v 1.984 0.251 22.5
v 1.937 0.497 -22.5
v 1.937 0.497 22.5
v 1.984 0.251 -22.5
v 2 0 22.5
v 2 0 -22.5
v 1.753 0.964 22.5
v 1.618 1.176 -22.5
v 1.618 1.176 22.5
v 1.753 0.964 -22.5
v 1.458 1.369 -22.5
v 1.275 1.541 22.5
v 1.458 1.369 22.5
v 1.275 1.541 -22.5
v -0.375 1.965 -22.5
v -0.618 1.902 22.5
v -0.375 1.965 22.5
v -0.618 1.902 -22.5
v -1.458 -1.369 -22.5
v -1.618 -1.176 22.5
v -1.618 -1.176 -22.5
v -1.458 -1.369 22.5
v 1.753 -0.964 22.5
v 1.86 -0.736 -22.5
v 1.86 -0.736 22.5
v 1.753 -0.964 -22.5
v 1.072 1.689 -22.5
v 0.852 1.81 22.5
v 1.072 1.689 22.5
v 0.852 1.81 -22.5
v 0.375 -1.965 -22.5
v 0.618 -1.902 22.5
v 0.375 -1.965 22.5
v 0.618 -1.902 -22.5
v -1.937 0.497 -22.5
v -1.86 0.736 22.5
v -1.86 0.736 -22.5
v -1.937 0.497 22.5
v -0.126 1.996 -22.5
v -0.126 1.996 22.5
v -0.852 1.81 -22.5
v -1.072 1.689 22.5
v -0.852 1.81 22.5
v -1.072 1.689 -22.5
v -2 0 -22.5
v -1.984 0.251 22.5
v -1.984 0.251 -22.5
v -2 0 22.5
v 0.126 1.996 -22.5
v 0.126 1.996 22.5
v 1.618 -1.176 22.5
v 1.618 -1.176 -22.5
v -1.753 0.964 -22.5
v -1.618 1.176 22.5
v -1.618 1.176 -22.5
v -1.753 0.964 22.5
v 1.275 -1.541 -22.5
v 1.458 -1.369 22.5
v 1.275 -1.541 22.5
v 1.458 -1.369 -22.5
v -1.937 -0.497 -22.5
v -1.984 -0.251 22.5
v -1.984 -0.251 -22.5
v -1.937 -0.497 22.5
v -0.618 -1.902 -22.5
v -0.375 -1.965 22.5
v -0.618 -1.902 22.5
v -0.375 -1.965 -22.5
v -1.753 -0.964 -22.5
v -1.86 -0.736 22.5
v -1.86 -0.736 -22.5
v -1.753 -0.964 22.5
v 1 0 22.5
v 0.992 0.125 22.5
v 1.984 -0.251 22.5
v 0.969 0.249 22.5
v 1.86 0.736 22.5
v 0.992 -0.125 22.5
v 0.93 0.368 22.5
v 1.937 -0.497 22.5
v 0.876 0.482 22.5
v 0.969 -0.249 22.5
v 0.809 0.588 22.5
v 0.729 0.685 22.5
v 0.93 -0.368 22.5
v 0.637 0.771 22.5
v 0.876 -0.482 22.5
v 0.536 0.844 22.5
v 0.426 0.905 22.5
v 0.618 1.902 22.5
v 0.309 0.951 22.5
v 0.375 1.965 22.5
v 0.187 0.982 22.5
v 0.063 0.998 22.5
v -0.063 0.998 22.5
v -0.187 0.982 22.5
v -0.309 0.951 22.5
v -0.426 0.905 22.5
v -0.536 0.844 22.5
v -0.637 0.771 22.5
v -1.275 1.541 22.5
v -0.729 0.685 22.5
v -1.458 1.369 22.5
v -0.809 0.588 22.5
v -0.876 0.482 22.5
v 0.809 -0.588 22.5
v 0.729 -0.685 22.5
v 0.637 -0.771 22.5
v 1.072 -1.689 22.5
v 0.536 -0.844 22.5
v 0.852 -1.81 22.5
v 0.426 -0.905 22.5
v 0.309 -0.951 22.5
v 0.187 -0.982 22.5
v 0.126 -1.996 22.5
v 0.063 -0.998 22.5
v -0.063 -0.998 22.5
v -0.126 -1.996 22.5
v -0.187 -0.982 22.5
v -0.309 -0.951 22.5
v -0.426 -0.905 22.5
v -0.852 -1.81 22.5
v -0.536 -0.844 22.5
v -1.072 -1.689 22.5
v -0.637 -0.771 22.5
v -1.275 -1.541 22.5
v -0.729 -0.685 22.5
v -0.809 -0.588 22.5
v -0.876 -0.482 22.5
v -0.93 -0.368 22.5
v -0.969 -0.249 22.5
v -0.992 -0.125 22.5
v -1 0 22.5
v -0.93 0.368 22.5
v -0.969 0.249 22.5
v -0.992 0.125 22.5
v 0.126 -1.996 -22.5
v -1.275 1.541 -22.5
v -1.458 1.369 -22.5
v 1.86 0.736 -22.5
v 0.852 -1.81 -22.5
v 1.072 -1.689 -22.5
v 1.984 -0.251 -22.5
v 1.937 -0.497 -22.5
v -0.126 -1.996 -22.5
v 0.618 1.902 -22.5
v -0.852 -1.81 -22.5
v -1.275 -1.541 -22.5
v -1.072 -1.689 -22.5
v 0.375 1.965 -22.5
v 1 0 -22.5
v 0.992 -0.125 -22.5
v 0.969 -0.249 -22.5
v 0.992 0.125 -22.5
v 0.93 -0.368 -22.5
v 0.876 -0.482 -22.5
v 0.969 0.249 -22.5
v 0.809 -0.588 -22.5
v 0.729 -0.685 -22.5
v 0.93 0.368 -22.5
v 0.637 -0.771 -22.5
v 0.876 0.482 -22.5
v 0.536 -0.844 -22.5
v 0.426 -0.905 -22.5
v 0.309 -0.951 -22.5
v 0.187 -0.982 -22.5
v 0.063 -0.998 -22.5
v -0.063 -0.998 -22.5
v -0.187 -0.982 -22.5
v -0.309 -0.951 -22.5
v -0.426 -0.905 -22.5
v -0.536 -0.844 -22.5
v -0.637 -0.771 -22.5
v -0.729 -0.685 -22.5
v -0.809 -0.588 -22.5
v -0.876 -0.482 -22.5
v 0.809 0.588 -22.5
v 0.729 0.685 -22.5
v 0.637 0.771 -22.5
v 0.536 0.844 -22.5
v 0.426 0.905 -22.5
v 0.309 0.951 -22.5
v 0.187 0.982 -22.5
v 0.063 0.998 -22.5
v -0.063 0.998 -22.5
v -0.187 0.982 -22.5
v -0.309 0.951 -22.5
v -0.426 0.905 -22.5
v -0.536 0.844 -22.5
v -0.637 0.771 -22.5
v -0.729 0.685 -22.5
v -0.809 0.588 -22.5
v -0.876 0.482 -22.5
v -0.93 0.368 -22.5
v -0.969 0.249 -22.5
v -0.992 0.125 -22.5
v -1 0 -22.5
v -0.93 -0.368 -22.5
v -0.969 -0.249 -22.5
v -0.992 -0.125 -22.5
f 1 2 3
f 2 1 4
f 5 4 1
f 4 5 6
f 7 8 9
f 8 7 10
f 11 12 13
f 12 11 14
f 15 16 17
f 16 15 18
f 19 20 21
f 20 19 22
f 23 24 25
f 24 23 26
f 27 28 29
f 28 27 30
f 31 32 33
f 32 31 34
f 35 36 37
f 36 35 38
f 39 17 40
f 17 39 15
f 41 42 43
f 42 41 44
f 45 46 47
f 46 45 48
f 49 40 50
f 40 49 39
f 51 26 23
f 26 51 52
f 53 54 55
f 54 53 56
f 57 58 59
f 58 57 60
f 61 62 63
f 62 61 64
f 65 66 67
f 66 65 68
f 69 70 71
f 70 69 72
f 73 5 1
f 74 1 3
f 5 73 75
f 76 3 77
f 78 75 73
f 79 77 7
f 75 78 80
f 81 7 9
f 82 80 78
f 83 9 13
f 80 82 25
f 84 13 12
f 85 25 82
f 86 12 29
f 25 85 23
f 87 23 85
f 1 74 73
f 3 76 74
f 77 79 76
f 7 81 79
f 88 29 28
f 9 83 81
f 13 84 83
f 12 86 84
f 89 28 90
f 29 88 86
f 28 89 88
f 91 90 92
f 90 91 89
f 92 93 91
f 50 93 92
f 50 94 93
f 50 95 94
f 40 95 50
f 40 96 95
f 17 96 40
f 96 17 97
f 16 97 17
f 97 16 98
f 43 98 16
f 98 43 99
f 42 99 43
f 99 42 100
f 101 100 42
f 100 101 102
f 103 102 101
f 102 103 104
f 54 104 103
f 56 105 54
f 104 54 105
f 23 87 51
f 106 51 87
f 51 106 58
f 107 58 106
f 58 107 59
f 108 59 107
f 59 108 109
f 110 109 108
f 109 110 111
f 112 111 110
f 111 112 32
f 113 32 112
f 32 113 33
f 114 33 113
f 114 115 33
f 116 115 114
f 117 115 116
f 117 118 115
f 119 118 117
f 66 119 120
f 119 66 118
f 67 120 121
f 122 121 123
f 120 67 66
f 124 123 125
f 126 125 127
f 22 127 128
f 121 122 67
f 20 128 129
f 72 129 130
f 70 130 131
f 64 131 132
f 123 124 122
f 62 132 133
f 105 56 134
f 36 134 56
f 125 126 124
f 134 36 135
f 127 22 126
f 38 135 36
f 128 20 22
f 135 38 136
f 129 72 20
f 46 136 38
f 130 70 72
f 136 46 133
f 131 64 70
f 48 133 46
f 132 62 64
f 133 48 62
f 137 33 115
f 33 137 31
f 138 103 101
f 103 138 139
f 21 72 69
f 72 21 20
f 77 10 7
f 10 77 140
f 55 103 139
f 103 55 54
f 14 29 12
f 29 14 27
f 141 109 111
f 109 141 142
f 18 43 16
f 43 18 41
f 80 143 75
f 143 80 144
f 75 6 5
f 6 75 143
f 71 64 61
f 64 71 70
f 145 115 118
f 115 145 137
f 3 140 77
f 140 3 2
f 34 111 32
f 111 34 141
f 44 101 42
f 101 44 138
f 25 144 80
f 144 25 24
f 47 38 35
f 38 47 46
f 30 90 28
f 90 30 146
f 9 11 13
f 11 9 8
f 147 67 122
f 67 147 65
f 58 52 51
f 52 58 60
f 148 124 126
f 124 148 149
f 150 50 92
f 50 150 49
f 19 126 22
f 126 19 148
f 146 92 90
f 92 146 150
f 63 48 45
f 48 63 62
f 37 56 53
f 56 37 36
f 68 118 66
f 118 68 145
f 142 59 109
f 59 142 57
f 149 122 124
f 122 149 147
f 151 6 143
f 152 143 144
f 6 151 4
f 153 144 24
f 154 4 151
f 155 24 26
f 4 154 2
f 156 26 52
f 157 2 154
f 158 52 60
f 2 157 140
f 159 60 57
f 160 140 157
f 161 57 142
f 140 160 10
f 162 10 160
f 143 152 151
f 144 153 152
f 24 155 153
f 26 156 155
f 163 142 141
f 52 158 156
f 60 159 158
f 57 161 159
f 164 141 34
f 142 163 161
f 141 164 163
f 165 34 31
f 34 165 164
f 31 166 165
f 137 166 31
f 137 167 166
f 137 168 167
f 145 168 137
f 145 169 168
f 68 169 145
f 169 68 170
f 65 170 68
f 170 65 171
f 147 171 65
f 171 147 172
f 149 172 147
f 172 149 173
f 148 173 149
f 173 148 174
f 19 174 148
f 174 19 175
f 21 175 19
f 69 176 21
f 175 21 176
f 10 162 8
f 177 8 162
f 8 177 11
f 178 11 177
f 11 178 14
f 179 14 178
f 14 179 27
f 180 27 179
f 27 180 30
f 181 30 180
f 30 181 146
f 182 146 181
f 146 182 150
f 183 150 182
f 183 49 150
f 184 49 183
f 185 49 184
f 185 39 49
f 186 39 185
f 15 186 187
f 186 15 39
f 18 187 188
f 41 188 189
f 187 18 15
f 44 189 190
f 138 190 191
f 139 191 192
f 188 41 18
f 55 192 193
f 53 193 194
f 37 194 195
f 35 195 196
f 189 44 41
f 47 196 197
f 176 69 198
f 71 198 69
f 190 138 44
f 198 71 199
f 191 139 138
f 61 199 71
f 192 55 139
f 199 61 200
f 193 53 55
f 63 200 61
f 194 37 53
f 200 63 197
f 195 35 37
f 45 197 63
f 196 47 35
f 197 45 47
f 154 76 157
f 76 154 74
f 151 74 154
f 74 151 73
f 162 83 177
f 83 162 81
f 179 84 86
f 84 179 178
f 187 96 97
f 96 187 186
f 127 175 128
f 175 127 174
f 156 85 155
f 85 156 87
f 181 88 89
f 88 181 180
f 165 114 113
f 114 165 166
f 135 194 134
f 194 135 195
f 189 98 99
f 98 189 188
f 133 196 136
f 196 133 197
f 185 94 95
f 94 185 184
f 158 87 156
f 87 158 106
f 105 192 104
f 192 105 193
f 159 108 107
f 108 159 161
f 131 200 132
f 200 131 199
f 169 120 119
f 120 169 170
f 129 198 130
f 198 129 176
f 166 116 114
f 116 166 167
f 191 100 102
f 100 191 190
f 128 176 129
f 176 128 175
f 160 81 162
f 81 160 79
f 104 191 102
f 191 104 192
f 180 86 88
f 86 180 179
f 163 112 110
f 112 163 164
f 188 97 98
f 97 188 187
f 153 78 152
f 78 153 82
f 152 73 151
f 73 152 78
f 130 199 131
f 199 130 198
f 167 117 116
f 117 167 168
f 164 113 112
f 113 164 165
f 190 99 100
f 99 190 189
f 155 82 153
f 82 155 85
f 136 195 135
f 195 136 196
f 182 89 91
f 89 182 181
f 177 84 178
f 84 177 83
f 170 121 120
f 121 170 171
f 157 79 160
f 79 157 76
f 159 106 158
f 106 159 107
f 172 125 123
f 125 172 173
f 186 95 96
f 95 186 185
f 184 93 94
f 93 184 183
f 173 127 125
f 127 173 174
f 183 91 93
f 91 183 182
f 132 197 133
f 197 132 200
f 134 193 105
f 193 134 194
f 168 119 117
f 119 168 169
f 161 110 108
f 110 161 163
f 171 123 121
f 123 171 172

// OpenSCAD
$fn = 50;


difference() {
	union() {
		translate(v = [0, 0, -22.5000000000]) {
			cylinder(h = 45, r = 2.0000000000);
		}
	}
	union() {
		translate(v = [0, 0, -100.0000000000]) {
			cylinder(h = 200, r = 1.0000000000);
		}
	}
}
